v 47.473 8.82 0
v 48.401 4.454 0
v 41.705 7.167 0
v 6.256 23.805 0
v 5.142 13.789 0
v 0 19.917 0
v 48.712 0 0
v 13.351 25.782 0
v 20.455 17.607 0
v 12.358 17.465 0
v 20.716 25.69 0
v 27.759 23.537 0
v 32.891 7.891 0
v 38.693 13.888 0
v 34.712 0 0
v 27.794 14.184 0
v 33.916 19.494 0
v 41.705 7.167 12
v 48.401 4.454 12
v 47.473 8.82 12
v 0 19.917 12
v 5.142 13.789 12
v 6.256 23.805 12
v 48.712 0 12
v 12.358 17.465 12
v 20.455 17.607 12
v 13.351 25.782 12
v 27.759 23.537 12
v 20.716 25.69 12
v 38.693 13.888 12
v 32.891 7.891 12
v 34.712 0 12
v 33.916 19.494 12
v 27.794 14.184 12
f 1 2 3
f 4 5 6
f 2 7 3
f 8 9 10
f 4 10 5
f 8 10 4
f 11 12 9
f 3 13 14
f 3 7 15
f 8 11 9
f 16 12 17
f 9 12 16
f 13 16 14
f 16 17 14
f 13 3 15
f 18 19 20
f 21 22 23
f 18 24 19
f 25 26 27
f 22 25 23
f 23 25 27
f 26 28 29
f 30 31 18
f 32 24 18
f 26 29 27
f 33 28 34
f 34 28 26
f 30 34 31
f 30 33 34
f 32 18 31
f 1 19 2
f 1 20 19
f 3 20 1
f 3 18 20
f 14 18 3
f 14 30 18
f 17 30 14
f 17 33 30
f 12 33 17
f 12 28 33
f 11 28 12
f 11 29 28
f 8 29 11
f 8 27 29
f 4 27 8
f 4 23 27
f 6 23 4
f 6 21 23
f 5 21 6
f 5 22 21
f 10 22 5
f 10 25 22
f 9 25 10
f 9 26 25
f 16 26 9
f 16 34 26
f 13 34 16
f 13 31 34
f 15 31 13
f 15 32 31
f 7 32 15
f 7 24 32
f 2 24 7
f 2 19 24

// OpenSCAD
$fn = 32;

// ----------------------------------------------------------------------
// Arc stop: segment, 12 mm thick
// ----------------------------------------------------------------------

// --- parameters (mm) ---
profile_height = 12;      // extrusion height
profile_points = 17;      // points of the closed outline

profile = [[48.712, 0], [48.401, 4.454], [47.473, 8.82], [41.705, 7.167], [38.693, 13.888], [33.916, 19.494], [27.759, 23.537], [20.716, 25.69], [13.351, 25.782], [6.256, 23.805], [0, 19.917], [5.142, 13.789], [12.358, 17.465], [20.455, 17.607], [27.794, 14.184], [32.891, 7.891], [34.712, 0]];  // single closed polygon, 17 points, counter clockwise

// --- the one profile operation ---
linear_extrude(height = profile_height) polygon(points = profile);
